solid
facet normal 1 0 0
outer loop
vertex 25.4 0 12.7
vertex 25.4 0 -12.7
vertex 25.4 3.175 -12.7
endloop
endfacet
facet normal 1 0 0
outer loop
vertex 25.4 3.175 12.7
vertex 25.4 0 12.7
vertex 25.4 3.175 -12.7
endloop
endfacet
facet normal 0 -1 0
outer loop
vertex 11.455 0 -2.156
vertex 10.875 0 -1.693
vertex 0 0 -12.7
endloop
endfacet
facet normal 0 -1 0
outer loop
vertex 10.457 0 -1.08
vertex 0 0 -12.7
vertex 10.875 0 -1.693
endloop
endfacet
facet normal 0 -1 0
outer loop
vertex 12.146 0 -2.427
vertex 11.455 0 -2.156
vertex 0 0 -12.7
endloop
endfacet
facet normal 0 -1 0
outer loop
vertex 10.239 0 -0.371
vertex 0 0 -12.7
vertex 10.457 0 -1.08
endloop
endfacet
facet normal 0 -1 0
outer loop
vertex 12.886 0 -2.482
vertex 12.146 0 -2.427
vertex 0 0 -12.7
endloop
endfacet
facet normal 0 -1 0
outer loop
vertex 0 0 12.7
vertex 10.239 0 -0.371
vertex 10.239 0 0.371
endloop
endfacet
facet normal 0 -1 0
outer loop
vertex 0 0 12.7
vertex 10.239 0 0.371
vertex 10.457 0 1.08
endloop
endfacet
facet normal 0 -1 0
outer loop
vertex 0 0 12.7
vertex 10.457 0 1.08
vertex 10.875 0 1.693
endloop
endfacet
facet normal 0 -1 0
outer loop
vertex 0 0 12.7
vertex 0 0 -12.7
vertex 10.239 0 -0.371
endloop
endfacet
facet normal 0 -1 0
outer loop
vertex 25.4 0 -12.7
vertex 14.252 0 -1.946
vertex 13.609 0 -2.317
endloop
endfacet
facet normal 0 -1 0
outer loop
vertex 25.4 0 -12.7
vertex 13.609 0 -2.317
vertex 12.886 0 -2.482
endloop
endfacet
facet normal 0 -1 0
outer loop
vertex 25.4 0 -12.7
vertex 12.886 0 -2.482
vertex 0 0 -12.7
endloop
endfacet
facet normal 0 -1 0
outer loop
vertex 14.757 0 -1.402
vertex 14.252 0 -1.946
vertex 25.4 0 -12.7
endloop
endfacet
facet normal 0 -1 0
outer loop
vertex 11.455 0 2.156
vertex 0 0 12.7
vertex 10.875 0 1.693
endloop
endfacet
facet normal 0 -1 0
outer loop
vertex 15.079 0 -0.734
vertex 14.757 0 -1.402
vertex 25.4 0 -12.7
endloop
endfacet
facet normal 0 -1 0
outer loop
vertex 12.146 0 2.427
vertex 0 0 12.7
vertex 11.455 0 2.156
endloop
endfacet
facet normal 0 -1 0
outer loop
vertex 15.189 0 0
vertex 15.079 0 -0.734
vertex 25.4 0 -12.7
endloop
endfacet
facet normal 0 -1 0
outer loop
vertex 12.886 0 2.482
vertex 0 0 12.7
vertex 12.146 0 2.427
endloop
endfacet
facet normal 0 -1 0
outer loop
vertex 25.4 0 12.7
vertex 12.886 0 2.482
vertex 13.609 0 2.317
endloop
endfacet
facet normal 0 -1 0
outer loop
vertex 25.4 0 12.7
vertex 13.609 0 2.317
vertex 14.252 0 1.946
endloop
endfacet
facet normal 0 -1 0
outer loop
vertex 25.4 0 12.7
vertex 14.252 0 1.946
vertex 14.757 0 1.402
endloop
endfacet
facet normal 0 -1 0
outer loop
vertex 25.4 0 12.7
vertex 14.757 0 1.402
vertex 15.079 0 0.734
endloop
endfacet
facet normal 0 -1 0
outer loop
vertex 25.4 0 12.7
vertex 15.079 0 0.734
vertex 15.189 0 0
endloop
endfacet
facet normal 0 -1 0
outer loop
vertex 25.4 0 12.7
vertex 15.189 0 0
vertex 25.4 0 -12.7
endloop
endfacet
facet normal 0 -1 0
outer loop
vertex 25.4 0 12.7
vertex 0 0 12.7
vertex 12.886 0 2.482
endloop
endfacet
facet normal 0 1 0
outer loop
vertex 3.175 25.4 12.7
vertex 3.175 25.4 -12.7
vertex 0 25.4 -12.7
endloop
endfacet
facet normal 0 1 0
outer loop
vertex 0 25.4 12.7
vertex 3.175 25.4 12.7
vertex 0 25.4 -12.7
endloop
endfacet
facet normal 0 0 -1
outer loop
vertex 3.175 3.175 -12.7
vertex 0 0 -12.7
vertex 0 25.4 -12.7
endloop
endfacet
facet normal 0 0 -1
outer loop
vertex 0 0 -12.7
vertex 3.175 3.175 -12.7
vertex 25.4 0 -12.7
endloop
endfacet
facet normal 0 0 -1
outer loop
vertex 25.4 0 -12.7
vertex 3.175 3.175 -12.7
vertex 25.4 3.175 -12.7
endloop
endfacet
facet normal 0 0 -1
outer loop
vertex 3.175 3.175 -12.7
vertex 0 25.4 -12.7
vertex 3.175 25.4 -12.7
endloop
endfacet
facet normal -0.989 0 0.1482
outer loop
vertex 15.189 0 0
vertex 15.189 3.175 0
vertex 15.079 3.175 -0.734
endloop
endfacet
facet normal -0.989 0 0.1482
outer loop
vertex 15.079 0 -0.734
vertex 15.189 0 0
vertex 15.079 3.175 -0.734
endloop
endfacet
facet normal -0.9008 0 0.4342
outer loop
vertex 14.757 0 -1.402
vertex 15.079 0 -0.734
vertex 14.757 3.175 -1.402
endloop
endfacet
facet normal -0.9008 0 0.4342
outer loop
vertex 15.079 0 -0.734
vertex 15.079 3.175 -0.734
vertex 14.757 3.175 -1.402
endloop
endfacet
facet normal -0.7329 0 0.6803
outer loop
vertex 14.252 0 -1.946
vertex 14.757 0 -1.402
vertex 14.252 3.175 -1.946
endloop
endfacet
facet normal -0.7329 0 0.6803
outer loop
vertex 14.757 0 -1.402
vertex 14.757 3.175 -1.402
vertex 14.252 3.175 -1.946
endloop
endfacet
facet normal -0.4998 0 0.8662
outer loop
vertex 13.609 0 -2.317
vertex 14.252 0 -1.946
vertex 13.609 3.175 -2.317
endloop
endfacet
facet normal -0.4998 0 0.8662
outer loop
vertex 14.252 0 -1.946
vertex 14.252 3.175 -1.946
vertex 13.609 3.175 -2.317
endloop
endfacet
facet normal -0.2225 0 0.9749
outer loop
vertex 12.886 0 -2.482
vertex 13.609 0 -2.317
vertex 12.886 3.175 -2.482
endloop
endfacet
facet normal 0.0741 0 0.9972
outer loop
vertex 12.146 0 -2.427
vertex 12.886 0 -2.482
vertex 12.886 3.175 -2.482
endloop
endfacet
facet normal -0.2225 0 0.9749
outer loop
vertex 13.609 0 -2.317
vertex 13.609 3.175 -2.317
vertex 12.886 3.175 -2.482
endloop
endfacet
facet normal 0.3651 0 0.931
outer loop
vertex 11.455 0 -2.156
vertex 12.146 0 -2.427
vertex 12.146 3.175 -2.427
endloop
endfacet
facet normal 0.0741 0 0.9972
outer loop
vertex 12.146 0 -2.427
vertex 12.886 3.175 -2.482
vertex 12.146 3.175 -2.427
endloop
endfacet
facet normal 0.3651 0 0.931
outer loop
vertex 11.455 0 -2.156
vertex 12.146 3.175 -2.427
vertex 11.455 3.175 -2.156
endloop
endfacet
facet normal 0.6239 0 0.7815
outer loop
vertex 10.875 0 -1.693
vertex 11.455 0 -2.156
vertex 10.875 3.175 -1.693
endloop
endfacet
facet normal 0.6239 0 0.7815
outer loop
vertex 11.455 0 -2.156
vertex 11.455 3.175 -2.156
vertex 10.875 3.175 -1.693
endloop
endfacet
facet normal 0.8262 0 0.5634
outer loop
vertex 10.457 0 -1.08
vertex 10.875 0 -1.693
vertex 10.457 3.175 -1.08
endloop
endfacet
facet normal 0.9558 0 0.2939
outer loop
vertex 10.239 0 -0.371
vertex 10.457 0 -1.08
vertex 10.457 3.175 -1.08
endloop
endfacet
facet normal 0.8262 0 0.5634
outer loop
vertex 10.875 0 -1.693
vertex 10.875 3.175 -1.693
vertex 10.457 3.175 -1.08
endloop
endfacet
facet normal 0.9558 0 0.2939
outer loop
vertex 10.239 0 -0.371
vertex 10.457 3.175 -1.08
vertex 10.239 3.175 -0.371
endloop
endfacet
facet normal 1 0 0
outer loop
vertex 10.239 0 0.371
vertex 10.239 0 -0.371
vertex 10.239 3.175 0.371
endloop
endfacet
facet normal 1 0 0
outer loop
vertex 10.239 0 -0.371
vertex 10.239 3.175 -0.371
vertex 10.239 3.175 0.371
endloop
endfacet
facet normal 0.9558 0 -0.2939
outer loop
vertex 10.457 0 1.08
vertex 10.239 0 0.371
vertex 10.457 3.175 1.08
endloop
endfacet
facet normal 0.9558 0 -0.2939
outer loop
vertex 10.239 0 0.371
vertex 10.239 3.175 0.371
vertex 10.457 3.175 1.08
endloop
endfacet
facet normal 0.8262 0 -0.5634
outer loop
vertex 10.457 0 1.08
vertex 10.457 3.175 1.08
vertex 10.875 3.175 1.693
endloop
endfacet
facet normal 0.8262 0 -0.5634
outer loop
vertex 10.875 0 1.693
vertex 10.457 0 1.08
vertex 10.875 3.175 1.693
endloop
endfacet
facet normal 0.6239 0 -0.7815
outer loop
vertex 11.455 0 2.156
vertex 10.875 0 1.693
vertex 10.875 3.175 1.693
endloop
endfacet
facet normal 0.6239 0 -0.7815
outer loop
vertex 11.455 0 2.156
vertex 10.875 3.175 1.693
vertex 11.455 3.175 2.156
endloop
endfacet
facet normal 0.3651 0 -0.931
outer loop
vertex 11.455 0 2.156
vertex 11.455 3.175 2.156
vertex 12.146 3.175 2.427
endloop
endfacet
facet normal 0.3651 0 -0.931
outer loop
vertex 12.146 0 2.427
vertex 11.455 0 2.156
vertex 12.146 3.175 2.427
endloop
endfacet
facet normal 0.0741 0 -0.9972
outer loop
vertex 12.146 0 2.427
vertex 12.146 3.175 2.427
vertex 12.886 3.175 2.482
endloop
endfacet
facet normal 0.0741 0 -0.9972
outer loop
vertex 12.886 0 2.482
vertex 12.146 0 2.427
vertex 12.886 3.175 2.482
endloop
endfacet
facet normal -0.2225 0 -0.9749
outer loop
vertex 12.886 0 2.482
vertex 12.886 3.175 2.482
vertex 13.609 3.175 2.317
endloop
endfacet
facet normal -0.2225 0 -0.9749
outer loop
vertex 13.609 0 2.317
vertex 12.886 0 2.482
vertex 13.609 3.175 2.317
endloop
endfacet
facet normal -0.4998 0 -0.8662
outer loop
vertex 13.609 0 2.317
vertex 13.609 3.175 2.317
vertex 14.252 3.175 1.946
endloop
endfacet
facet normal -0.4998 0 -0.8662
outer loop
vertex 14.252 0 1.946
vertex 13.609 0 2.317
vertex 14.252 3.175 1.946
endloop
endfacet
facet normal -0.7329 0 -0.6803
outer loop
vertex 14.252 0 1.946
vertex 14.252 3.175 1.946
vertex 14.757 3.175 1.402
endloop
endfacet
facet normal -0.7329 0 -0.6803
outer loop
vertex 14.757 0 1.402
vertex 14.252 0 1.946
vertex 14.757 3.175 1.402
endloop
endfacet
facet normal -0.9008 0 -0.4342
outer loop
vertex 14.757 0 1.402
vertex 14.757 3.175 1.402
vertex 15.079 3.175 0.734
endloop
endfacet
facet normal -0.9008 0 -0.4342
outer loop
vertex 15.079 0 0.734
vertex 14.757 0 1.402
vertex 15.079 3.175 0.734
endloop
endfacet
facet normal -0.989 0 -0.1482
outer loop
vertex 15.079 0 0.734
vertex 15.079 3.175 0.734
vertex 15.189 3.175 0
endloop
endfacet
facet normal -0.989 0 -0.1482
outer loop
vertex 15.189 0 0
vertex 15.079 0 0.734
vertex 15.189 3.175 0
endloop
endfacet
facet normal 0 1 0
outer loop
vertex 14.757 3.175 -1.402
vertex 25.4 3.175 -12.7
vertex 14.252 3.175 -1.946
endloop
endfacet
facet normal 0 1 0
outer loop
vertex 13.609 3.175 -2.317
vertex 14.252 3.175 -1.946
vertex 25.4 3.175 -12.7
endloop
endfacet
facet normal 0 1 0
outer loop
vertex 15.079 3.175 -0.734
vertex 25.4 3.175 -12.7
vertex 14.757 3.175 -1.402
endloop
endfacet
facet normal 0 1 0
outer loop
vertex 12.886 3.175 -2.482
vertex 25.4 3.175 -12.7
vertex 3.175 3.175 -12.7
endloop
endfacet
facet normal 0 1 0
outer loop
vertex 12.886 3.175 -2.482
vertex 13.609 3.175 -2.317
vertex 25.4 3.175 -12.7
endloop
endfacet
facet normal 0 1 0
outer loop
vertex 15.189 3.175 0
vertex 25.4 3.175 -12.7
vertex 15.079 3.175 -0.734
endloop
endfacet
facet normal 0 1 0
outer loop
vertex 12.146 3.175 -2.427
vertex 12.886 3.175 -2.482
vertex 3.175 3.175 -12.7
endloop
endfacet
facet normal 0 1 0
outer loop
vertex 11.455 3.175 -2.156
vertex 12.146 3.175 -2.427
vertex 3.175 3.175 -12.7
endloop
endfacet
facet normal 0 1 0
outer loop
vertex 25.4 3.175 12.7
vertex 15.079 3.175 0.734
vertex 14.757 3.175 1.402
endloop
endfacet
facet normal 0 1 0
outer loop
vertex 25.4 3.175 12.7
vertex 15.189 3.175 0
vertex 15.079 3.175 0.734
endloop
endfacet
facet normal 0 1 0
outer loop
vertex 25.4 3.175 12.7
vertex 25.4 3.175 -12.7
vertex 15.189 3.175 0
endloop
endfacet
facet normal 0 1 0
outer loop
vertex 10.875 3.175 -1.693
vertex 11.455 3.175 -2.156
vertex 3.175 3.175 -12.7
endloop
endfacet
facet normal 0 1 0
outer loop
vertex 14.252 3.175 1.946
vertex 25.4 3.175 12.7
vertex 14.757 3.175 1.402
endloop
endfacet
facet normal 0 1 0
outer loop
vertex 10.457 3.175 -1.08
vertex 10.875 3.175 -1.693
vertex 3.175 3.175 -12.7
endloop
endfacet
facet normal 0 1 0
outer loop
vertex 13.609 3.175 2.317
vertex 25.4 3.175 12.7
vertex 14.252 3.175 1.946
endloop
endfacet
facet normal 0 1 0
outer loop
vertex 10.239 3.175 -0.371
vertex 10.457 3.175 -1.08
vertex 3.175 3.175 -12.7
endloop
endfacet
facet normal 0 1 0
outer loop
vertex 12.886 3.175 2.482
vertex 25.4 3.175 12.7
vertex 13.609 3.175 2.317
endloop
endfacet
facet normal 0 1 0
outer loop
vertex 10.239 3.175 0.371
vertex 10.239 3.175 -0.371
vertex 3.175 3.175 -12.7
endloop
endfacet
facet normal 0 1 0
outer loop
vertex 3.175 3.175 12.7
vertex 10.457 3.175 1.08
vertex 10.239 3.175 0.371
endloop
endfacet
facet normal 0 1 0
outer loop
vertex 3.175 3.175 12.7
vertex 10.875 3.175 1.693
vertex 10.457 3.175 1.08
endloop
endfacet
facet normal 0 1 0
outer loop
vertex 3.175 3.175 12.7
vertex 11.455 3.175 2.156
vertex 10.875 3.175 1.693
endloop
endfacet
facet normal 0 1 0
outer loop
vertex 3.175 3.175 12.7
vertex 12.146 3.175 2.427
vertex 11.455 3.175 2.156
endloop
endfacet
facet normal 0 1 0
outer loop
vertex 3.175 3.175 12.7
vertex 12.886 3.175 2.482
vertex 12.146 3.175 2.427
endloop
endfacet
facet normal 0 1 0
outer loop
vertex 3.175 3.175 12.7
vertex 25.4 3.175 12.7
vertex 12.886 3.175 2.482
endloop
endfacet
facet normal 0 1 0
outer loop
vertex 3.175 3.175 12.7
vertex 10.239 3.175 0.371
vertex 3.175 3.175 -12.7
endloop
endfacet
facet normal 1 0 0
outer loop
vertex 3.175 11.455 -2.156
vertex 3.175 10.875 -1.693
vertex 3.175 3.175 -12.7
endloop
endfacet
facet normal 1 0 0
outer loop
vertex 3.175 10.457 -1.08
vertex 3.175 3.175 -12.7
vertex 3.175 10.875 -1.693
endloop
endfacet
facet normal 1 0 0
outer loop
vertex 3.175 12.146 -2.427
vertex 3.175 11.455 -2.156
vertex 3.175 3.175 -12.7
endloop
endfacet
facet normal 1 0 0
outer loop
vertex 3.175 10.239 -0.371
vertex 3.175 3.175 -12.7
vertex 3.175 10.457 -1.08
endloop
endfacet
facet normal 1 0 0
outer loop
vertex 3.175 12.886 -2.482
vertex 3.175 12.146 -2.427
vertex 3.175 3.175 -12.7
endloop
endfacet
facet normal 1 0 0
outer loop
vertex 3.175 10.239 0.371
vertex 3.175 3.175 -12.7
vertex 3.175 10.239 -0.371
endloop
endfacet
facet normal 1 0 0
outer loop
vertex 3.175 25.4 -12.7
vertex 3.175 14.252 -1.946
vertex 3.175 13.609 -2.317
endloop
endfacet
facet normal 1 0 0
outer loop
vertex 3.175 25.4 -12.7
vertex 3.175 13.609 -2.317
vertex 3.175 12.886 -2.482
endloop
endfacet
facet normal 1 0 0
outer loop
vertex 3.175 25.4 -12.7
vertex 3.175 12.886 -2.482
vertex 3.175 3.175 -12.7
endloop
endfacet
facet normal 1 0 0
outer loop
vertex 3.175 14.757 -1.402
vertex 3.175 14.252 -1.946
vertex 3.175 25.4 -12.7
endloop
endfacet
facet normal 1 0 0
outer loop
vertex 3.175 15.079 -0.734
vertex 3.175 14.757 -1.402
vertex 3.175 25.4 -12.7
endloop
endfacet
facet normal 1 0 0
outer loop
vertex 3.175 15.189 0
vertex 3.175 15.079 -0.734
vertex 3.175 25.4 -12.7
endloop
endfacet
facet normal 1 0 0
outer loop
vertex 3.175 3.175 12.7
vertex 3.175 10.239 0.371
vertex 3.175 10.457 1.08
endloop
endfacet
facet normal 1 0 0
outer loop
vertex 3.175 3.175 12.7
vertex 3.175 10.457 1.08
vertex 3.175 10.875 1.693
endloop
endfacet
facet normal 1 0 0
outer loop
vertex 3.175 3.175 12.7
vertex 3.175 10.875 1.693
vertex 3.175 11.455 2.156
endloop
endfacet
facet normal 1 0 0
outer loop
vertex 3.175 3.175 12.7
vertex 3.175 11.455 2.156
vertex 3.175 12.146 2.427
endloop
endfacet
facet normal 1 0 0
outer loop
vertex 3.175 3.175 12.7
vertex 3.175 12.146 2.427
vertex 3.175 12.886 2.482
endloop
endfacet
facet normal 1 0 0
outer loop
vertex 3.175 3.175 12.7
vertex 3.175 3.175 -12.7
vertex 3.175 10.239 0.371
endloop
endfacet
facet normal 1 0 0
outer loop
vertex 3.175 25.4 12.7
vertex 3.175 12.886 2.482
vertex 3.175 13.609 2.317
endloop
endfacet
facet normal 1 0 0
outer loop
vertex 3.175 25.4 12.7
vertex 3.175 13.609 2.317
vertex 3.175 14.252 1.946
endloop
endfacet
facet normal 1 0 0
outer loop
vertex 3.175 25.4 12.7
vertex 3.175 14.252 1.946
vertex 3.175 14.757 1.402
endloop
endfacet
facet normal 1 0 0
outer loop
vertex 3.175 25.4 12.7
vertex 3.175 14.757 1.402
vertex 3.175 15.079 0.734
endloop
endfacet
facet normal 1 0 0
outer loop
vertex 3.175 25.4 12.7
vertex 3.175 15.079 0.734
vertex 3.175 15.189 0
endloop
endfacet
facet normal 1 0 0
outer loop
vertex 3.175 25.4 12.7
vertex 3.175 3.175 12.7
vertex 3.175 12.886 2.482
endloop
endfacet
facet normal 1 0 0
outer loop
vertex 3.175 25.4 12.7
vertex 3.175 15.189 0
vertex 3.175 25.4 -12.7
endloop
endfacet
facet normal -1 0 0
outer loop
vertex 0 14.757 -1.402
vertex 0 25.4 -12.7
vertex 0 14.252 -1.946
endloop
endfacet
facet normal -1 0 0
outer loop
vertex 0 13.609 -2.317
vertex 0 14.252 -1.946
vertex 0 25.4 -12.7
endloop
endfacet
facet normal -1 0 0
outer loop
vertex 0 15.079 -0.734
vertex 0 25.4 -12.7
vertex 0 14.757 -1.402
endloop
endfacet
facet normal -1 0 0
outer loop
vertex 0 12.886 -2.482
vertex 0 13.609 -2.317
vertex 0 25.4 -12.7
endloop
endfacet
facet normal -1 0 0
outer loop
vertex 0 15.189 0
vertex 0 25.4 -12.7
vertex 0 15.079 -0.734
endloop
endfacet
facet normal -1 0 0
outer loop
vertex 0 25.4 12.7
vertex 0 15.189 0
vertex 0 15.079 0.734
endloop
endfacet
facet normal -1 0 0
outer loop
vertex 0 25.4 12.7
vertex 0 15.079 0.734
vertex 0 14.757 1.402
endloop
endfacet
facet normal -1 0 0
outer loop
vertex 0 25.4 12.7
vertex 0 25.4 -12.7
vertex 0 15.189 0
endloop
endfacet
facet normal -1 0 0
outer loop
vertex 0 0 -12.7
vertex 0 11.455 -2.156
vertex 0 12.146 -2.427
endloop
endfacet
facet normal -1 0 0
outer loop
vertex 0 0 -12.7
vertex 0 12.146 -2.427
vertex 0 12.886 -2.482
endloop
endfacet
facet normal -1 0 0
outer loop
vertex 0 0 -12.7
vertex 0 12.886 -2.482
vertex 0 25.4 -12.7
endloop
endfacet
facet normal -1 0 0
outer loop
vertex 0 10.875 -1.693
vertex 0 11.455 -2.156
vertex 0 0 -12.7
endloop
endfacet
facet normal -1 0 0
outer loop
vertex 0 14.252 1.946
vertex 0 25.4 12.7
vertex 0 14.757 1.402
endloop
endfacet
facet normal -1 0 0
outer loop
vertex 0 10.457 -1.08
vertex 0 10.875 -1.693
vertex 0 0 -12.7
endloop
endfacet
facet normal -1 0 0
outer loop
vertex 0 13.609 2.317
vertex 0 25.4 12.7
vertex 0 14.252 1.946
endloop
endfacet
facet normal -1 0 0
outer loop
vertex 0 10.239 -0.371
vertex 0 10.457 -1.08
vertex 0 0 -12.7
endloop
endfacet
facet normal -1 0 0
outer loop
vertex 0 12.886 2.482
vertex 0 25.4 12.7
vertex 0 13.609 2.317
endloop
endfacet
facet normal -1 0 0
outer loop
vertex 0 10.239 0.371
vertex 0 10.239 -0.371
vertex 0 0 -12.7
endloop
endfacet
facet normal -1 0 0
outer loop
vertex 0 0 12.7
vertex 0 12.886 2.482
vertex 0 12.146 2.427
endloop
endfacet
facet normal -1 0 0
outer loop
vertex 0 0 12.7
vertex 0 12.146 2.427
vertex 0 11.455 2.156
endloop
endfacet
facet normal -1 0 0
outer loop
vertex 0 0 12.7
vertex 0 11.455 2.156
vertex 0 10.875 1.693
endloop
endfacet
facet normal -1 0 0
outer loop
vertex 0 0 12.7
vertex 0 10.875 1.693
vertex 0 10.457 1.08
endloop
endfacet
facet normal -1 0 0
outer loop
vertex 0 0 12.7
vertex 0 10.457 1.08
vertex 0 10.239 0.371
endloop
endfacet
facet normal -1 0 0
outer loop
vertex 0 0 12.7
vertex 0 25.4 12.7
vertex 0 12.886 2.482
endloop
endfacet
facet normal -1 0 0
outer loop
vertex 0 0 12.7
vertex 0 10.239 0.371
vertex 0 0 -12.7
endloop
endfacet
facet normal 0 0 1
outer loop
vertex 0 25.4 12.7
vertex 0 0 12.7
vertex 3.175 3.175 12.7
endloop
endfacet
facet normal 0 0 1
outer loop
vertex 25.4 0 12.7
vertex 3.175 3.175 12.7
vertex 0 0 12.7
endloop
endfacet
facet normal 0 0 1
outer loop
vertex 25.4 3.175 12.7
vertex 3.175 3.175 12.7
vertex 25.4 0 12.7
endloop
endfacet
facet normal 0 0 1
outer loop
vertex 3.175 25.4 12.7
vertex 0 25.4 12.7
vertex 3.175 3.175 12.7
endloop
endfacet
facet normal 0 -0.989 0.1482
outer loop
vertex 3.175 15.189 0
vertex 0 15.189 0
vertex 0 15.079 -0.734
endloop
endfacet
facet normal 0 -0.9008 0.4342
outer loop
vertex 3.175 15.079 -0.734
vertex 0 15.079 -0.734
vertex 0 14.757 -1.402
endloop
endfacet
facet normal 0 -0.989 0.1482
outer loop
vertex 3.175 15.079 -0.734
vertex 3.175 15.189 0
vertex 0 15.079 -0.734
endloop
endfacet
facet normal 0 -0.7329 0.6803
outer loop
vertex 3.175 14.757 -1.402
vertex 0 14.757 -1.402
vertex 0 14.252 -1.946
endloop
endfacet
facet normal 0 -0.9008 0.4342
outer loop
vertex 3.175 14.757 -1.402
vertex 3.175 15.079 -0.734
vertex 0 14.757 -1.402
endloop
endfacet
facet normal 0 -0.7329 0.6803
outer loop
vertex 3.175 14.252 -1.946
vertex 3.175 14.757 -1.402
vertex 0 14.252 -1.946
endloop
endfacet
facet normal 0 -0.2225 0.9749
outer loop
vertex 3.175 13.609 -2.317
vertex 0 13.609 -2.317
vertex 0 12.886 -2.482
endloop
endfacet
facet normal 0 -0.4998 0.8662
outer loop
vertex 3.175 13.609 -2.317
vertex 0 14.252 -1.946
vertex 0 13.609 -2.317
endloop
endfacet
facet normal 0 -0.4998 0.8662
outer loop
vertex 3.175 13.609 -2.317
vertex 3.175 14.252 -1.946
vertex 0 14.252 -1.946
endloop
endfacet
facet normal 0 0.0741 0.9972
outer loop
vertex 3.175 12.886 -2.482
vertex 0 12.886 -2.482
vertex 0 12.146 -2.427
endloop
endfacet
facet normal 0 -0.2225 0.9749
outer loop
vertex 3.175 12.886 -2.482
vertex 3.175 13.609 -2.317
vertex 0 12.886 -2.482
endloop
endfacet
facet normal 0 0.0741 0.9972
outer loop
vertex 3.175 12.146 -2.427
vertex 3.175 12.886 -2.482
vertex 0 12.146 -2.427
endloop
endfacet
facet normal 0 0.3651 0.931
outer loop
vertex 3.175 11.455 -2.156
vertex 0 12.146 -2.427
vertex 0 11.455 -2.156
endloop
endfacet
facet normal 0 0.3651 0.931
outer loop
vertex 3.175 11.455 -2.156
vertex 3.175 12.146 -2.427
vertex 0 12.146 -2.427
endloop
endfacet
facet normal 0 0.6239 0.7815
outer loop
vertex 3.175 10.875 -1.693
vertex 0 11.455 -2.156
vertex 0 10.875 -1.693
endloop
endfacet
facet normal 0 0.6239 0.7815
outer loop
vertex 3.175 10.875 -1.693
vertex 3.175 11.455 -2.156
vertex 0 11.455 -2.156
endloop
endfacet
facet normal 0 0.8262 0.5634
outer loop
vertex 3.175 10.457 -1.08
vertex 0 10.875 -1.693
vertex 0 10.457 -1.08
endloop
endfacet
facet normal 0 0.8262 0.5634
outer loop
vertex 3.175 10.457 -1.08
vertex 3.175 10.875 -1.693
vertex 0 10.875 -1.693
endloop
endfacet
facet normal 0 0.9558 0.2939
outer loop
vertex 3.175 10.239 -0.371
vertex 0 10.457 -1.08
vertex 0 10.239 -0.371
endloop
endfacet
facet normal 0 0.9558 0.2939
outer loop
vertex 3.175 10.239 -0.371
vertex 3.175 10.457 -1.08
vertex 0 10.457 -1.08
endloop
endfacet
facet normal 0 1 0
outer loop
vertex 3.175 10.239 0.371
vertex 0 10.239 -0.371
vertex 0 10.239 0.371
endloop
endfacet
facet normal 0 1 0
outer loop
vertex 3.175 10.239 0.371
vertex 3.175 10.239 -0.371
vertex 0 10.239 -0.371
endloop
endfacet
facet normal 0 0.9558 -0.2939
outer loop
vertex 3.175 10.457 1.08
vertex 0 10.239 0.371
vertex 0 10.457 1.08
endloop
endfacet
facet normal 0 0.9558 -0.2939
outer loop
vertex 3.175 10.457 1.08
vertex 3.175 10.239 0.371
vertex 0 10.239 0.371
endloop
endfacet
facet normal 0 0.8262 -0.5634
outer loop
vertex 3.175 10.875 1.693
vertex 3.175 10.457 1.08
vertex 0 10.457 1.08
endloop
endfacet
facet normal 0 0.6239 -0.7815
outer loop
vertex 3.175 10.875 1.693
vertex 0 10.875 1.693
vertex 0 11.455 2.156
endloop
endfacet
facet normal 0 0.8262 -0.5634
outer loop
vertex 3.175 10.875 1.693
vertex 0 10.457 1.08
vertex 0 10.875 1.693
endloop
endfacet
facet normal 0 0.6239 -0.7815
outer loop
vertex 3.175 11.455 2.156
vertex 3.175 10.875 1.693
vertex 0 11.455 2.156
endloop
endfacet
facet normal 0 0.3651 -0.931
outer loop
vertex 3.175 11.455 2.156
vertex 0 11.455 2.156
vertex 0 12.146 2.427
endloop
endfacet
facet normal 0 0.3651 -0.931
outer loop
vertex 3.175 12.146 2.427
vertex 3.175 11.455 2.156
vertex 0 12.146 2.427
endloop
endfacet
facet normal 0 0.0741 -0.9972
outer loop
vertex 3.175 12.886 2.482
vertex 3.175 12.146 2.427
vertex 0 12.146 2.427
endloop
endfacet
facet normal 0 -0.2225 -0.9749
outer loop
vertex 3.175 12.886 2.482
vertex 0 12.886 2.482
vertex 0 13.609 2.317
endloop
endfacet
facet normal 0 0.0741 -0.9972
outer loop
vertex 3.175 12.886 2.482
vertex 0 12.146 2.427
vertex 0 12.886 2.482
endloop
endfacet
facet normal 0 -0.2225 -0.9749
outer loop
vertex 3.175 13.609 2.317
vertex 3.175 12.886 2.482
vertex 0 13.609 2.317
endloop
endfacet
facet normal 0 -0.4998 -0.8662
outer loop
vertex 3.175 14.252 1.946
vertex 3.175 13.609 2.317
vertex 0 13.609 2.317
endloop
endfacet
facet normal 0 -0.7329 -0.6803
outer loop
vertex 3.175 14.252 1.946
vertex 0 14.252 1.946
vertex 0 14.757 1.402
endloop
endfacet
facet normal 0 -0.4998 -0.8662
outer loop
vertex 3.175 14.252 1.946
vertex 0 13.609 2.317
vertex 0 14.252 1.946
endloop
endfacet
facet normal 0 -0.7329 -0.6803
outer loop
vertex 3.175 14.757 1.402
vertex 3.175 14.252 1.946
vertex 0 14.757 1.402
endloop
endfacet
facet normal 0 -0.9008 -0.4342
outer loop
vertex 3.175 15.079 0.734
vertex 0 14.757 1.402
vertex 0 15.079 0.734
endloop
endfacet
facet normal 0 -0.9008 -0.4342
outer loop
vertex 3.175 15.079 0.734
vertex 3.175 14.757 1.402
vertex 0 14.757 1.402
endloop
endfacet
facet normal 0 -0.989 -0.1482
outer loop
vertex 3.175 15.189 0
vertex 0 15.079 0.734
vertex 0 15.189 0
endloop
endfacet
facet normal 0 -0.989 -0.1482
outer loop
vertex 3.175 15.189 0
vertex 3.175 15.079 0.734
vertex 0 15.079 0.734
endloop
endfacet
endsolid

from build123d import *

# Parameters (mm, degrees)
EXTRUDE_THIN1_DEPTH = 12.7
SKETCH2_R           = 2.4892
CUT_EXTRUDE1_DEPTH  = 4.175


with BuildPart() as part:
    # Sketch1 → Extrude-Thin1 (new body, symmetric)
    with BuildSketch(Plane.XY):
        Polygon((0, 25.4), (0, 0), (25.4, 0), (25.4, 3.175), (3.175, 3.175), (3.175, 25.4), align=None)
    extrude(amount=EXTRUDE_THIN1_DEPTH, both=True)

    # Sketch2 → Cut-Extrude1 (cut, through all)
    with BuildSketch(Plane(origin=(0, 3.175, 0), x_dir=(1, 0, 0), z_dir=(0, 1, 0))):
        with Locations((12.7, 0)):
            Circle(SKETCH2_R)
    cut_extrude1 = extrude(amount=-CUT_EXTRUDE1_DEPTH, mode=Mode.SUBTRACT)

    # Mirror1: Cut-Extrude1 across plane
    add(cut_extrude1.mirror(Plane(origin=(0, 0, 0), x_dir=(0, 0, 1), z_dir=(0.707106781, -0.707106781, 0))), mode=Mode.SUBTRACT)


solid = part.part
